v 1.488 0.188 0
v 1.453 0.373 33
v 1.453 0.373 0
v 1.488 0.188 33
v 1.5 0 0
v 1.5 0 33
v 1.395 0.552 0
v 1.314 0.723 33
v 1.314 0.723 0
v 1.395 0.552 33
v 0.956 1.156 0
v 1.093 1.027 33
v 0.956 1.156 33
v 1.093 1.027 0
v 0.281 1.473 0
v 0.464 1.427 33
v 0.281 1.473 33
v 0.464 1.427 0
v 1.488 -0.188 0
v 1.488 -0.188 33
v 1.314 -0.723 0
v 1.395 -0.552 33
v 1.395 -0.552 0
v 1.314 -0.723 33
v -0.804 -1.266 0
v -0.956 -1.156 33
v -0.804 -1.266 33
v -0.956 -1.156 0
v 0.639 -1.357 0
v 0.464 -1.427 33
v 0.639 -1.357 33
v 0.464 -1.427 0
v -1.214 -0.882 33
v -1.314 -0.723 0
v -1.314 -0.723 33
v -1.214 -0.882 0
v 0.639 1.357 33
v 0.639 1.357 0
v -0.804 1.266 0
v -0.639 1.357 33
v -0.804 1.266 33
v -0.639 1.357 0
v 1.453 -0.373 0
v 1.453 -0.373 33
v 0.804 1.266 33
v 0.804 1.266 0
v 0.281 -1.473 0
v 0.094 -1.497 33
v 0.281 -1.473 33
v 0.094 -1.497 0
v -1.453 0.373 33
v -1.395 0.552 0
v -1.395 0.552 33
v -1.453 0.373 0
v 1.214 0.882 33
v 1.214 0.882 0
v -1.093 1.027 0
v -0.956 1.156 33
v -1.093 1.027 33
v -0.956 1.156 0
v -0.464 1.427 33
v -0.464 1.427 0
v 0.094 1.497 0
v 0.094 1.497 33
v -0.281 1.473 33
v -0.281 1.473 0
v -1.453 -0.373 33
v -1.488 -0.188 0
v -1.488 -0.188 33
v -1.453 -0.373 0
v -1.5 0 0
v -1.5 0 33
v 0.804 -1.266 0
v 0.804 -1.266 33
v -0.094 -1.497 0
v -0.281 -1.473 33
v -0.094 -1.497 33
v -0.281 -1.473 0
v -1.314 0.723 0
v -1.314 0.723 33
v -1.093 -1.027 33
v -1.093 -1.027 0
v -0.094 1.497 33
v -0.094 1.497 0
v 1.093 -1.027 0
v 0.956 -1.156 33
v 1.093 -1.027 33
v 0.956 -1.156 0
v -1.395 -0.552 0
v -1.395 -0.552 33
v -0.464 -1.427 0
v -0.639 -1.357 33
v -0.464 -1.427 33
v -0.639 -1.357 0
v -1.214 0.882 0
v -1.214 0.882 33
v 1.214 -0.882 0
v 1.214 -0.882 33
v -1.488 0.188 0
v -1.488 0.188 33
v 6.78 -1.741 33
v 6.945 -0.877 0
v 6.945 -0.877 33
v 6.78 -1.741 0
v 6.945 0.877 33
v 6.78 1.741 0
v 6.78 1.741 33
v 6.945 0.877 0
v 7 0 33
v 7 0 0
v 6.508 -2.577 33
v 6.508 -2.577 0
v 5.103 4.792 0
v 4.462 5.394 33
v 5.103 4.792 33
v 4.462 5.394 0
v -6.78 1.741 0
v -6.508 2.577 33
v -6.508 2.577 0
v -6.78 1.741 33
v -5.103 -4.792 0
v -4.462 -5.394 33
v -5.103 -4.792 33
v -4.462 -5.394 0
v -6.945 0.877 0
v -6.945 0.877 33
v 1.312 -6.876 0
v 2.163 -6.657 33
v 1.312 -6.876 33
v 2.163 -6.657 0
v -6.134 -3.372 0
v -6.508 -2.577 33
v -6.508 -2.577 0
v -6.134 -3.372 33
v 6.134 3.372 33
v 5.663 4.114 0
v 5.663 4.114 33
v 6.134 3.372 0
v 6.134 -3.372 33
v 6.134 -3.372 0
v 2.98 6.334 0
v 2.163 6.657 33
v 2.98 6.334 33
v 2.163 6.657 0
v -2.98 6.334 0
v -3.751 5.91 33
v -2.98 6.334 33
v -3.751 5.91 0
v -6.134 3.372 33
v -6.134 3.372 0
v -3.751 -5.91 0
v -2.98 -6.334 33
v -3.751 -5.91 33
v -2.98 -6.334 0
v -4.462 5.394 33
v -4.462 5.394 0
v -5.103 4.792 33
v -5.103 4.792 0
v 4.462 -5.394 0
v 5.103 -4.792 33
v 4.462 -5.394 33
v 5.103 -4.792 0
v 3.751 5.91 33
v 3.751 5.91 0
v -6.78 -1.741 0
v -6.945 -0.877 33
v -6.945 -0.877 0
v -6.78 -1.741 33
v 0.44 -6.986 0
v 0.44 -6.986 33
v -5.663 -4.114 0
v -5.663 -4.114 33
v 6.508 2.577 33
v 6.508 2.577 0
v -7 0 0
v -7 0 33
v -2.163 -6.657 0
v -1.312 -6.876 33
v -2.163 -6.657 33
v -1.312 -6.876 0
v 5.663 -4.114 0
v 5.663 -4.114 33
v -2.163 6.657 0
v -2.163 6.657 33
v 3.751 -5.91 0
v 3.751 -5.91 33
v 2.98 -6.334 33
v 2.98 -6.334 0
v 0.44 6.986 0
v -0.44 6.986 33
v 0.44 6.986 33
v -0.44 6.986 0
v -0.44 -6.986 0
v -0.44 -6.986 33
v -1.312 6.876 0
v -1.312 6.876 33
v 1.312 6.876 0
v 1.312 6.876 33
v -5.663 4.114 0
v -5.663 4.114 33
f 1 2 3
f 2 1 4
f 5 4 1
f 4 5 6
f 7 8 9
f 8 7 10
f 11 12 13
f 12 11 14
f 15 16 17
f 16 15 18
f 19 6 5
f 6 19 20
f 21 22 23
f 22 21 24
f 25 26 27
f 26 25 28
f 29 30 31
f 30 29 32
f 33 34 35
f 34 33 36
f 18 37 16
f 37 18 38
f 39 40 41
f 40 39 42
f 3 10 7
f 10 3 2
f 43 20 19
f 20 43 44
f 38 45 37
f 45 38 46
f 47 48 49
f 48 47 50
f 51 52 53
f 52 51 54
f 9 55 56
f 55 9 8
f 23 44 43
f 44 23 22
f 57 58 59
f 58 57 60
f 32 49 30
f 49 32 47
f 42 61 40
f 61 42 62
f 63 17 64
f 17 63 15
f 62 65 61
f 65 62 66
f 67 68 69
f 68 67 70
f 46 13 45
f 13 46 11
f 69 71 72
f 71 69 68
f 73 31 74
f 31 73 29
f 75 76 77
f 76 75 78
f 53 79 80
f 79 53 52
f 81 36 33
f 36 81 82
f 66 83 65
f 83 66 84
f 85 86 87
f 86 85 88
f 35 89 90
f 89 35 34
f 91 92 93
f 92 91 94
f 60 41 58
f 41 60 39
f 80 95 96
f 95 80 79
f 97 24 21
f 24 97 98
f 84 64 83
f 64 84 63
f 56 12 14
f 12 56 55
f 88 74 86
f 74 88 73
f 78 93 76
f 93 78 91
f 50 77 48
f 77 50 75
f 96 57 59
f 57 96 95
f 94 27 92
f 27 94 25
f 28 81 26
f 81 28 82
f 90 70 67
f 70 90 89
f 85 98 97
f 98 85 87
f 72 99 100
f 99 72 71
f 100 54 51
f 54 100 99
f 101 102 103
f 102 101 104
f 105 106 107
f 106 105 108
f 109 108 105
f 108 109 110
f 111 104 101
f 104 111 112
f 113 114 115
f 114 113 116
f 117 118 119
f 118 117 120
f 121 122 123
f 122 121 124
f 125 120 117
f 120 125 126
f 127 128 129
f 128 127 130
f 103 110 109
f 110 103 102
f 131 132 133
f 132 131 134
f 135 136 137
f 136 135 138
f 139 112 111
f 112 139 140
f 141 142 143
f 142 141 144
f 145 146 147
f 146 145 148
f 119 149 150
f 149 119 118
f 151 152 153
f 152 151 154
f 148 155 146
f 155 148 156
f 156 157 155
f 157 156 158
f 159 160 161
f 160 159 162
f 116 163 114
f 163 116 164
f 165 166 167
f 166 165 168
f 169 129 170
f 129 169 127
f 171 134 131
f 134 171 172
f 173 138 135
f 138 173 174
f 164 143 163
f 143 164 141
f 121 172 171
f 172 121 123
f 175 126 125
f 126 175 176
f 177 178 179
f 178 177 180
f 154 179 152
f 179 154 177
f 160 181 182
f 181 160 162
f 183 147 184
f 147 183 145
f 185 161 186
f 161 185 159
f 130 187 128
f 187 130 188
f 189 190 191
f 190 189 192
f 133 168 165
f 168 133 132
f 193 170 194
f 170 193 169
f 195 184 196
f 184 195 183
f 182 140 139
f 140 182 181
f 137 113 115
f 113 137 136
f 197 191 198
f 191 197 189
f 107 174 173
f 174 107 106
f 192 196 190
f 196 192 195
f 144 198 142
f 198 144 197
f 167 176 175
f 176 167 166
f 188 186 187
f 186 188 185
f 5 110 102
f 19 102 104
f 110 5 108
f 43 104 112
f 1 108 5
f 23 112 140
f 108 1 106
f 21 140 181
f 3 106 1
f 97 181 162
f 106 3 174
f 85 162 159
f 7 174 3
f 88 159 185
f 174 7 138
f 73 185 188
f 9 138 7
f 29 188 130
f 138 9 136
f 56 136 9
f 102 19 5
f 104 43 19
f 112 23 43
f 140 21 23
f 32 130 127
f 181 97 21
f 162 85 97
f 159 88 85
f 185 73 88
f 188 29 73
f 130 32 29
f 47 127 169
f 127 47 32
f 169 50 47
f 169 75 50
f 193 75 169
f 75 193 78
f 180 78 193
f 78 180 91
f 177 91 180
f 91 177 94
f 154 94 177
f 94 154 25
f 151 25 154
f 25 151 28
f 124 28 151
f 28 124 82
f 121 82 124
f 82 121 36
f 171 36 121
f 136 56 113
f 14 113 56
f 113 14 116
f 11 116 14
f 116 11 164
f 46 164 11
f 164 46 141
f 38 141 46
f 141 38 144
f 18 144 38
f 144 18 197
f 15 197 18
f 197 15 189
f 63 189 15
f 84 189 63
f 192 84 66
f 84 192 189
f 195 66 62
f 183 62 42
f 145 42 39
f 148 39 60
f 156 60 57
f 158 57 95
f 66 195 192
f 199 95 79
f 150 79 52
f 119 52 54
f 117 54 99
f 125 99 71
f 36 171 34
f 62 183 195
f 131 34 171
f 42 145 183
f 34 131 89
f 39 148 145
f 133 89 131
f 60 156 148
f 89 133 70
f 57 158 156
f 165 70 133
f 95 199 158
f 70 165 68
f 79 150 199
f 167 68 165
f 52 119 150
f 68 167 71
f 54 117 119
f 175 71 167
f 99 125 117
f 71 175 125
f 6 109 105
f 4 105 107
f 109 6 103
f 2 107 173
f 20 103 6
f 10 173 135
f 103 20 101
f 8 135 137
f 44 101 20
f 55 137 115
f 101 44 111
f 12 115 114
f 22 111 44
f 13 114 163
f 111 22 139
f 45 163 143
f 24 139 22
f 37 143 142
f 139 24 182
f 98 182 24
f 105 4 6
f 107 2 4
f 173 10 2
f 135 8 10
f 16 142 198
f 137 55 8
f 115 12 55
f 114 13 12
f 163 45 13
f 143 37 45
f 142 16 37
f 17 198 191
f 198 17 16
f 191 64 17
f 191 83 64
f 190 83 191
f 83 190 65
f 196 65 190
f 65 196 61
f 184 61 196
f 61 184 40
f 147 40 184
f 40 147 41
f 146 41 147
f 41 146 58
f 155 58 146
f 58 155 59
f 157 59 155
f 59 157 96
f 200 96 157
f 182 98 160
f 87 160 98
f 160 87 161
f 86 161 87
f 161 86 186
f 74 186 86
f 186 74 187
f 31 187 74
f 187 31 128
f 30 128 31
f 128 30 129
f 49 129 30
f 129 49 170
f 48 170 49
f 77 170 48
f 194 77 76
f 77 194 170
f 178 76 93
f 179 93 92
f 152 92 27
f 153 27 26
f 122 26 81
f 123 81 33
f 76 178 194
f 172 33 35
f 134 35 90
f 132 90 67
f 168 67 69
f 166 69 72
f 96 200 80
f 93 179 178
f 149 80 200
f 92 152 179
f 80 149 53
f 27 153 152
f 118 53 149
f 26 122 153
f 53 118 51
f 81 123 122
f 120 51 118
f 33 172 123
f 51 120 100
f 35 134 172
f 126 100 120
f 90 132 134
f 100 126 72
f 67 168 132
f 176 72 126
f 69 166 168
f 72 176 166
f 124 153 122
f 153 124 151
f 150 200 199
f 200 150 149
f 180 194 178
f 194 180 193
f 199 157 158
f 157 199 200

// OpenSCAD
$fn = 50;


difference() {
	union() {
		cylinder(h = 33, r = 7.0000000000);
	}
	union() {
		translate(v = [0, 0, -100]) {
			cylinder(h = 200, r = 1.5000000000);
		}
		translate(v = [0, 0, -100]) {
			cylinder(h = 200, r = 1.5000000000);
		}
	}
}
